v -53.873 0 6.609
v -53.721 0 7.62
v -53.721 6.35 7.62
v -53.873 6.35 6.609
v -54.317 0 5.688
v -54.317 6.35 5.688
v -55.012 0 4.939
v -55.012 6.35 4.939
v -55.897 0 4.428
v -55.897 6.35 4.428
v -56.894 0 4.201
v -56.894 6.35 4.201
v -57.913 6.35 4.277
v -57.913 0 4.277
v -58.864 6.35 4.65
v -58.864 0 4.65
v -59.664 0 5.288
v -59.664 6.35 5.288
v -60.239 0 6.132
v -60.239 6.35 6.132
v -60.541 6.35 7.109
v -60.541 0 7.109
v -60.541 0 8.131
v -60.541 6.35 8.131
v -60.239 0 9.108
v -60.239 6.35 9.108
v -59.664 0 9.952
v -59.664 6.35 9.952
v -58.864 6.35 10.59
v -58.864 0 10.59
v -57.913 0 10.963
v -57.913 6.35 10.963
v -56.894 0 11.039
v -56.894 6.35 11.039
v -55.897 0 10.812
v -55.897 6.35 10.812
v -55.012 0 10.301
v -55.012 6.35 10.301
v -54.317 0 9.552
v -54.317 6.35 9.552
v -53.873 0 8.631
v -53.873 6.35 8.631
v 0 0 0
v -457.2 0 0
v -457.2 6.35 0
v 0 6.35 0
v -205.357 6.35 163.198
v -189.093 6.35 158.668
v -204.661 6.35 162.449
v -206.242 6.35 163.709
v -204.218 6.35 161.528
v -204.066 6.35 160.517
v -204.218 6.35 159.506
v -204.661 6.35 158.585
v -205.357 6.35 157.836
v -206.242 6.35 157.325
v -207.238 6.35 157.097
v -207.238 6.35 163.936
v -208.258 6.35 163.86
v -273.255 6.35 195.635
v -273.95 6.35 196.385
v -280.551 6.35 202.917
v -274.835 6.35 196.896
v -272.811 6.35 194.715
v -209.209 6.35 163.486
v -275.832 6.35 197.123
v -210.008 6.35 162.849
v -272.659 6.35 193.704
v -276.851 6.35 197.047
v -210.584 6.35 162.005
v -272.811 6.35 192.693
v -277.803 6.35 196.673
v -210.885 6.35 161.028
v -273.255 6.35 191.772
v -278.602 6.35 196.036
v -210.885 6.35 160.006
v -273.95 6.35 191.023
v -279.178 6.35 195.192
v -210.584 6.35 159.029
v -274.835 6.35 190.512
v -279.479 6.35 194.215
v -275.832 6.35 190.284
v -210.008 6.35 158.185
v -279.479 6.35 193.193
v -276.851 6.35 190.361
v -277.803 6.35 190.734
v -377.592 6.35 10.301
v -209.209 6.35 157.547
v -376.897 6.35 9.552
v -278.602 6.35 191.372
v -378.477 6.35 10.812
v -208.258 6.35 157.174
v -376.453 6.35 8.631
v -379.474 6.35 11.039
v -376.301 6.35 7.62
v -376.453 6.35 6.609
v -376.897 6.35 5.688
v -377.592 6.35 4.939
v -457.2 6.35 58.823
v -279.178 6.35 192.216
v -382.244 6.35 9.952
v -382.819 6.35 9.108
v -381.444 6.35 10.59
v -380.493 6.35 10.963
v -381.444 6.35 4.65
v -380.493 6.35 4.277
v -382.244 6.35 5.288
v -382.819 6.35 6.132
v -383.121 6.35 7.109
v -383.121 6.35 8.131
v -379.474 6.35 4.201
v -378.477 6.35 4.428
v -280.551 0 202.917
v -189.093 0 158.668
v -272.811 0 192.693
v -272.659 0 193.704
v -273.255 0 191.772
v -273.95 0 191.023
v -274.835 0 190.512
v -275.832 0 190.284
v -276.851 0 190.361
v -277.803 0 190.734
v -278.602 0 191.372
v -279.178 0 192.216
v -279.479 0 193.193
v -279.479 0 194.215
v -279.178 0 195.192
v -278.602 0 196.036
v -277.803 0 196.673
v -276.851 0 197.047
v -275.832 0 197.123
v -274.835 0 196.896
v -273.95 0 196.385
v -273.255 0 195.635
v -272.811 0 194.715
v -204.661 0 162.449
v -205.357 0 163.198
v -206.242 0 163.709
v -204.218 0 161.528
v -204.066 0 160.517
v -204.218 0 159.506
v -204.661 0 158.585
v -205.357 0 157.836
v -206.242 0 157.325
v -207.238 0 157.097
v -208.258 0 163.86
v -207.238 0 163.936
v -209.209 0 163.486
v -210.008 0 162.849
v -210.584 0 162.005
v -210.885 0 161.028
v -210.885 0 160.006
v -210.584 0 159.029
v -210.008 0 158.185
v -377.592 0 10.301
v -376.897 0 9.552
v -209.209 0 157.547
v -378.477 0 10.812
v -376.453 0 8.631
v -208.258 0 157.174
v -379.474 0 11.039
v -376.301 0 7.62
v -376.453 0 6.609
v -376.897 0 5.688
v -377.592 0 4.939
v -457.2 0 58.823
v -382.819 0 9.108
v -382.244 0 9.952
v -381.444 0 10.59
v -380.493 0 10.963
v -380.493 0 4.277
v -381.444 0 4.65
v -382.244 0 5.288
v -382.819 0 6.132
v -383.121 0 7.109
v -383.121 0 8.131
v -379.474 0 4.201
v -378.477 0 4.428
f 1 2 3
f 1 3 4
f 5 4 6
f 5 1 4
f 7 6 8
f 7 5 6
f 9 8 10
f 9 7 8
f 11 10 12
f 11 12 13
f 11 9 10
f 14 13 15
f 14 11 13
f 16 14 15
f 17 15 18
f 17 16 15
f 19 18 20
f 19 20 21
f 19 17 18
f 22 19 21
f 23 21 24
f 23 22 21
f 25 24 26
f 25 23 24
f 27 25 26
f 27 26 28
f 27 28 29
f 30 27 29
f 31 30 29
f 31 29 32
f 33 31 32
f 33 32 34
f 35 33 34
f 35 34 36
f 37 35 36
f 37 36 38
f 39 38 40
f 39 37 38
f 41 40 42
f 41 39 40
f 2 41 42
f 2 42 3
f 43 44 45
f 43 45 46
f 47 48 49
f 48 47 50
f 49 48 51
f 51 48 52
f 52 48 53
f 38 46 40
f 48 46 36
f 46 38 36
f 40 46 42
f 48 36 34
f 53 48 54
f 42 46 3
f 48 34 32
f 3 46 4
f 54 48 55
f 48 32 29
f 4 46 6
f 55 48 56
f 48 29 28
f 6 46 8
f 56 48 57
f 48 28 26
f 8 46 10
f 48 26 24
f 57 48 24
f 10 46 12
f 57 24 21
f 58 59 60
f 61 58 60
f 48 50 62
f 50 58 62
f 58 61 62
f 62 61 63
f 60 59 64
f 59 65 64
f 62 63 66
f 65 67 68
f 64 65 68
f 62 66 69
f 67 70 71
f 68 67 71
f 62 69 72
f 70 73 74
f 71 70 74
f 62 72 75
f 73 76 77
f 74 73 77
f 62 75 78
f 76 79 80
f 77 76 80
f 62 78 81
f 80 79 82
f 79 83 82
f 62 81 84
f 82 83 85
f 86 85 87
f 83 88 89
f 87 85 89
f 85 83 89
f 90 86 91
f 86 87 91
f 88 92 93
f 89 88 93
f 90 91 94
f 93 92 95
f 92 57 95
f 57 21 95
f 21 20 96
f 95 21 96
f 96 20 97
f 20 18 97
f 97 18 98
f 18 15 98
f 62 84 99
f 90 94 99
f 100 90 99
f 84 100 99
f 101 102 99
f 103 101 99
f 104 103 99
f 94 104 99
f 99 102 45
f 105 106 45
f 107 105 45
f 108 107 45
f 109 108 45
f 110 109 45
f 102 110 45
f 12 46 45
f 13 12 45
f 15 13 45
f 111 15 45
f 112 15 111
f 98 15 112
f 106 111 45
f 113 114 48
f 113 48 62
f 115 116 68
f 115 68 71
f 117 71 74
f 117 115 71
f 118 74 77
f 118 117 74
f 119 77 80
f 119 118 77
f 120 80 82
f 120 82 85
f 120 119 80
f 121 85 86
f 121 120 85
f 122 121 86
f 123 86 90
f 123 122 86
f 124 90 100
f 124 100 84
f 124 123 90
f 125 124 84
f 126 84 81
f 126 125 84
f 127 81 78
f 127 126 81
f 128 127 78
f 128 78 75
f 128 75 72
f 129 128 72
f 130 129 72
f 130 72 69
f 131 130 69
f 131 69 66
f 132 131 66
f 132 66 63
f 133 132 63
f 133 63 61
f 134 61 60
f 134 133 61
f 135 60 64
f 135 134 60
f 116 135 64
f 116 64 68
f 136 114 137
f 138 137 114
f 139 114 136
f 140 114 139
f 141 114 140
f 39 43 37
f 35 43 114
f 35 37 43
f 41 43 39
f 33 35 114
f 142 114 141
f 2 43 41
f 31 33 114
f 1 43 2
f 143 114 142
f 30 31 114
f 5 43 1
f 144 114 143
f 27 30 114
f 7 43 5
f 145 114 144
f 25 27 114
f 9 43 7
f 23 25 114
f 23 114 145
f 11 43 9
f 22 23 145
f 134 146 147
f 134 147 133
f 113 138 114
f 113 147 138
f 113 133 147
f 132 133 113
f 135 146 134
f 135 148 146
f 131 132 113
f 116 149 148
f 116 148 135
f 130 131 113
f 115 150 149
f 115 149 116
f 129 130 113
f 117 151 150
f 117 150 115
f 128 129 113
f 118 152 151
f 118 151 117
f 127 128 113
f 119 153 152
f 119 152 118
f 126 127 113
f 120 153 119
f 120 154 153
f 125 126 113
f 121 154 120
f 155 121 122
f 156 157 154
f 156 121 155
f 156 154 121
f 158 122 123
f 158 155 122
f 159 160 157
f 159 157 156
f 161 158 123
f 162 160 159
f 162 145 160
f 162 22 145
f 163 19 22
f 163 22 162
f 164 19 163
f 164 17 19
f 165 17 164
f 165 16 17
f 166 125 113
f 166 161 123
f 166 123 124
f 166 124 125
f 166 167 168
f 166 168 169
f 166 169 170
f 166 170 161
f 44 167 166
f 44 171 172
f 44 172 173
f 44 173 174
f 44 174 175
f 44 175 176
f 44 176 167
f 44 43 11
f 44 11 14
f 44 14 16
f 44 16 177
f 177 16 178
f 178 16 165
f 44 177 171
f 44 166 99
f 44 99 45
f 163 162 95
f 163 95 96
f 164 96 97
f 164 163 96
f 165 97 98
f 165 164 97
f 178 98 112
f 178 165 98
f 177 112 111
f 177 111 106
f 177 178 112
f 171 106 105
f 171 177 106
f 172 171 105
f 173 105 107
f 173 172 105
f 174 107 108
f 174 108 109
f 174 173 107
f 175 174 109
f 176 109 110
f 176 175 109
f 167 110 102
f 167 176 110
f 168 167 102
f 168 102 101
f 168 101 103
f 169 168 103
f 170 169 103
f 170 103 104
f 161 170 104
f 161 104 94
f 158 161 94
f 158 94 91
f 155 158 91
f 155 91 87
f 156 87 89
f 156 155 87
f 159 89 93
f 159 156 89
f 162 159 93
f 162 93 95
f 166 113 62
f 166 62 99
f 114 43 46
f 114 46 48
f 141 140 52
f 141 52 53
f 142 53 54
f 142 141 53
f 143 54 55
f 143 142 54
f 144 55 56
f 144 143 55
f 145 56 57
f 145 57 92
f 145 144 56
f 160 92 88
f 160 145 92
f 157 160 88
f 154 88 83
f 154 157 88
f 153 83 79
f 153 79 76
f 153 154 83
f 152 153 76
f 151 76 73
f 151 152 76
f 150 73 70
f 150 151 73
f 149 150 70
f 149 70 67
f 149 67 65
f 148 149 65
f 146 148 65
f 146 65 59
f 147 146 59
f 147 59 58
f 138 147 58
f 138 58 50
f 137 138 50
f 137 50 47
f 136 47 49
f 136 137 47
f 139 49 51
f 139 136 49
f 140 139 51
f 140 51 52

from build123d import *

# Parameters (mm, degrees)
SKETCH1_R           = 3.429
BOSS_EXTRUDE1_DEPTH = 6.35


with BuildPart() as part:
    # Sketch1 → Boss-Extrude1 (new body)
    with BuildSketch(Plane(origin=(0, 0, 0), x_dir=(1, 0, 0), z_dir=(0, 1, 0))):
        Polygon((-189.09320701, -158.66804026), (-280.551178696, -202.917327431), (-457.2, -58.822791946), (-457.2, 0), (0, 0), align=None)
        with Locations((-207.494657953, -160.516879503)):
            Circle(SKETCH1_R, mode=Mode.SUBTRACT)
        with Locations((-276.088136717, -193.703844882)):
            Circle(SKETCH1_R, mode=Mode.SUBTRACT)
        with Locations((-57.15, -7.62)):
            Circle(SKETCH1_R, mode=Mode.SUBTRACT)
        with Locations((-379.73, -7.62)):
            Circle(SKETCH1_R, mode=Mode.SUBTRACT)
    extrude(amount=BOSS_EXTRUDE1_DEPTH)


solid = part.part
